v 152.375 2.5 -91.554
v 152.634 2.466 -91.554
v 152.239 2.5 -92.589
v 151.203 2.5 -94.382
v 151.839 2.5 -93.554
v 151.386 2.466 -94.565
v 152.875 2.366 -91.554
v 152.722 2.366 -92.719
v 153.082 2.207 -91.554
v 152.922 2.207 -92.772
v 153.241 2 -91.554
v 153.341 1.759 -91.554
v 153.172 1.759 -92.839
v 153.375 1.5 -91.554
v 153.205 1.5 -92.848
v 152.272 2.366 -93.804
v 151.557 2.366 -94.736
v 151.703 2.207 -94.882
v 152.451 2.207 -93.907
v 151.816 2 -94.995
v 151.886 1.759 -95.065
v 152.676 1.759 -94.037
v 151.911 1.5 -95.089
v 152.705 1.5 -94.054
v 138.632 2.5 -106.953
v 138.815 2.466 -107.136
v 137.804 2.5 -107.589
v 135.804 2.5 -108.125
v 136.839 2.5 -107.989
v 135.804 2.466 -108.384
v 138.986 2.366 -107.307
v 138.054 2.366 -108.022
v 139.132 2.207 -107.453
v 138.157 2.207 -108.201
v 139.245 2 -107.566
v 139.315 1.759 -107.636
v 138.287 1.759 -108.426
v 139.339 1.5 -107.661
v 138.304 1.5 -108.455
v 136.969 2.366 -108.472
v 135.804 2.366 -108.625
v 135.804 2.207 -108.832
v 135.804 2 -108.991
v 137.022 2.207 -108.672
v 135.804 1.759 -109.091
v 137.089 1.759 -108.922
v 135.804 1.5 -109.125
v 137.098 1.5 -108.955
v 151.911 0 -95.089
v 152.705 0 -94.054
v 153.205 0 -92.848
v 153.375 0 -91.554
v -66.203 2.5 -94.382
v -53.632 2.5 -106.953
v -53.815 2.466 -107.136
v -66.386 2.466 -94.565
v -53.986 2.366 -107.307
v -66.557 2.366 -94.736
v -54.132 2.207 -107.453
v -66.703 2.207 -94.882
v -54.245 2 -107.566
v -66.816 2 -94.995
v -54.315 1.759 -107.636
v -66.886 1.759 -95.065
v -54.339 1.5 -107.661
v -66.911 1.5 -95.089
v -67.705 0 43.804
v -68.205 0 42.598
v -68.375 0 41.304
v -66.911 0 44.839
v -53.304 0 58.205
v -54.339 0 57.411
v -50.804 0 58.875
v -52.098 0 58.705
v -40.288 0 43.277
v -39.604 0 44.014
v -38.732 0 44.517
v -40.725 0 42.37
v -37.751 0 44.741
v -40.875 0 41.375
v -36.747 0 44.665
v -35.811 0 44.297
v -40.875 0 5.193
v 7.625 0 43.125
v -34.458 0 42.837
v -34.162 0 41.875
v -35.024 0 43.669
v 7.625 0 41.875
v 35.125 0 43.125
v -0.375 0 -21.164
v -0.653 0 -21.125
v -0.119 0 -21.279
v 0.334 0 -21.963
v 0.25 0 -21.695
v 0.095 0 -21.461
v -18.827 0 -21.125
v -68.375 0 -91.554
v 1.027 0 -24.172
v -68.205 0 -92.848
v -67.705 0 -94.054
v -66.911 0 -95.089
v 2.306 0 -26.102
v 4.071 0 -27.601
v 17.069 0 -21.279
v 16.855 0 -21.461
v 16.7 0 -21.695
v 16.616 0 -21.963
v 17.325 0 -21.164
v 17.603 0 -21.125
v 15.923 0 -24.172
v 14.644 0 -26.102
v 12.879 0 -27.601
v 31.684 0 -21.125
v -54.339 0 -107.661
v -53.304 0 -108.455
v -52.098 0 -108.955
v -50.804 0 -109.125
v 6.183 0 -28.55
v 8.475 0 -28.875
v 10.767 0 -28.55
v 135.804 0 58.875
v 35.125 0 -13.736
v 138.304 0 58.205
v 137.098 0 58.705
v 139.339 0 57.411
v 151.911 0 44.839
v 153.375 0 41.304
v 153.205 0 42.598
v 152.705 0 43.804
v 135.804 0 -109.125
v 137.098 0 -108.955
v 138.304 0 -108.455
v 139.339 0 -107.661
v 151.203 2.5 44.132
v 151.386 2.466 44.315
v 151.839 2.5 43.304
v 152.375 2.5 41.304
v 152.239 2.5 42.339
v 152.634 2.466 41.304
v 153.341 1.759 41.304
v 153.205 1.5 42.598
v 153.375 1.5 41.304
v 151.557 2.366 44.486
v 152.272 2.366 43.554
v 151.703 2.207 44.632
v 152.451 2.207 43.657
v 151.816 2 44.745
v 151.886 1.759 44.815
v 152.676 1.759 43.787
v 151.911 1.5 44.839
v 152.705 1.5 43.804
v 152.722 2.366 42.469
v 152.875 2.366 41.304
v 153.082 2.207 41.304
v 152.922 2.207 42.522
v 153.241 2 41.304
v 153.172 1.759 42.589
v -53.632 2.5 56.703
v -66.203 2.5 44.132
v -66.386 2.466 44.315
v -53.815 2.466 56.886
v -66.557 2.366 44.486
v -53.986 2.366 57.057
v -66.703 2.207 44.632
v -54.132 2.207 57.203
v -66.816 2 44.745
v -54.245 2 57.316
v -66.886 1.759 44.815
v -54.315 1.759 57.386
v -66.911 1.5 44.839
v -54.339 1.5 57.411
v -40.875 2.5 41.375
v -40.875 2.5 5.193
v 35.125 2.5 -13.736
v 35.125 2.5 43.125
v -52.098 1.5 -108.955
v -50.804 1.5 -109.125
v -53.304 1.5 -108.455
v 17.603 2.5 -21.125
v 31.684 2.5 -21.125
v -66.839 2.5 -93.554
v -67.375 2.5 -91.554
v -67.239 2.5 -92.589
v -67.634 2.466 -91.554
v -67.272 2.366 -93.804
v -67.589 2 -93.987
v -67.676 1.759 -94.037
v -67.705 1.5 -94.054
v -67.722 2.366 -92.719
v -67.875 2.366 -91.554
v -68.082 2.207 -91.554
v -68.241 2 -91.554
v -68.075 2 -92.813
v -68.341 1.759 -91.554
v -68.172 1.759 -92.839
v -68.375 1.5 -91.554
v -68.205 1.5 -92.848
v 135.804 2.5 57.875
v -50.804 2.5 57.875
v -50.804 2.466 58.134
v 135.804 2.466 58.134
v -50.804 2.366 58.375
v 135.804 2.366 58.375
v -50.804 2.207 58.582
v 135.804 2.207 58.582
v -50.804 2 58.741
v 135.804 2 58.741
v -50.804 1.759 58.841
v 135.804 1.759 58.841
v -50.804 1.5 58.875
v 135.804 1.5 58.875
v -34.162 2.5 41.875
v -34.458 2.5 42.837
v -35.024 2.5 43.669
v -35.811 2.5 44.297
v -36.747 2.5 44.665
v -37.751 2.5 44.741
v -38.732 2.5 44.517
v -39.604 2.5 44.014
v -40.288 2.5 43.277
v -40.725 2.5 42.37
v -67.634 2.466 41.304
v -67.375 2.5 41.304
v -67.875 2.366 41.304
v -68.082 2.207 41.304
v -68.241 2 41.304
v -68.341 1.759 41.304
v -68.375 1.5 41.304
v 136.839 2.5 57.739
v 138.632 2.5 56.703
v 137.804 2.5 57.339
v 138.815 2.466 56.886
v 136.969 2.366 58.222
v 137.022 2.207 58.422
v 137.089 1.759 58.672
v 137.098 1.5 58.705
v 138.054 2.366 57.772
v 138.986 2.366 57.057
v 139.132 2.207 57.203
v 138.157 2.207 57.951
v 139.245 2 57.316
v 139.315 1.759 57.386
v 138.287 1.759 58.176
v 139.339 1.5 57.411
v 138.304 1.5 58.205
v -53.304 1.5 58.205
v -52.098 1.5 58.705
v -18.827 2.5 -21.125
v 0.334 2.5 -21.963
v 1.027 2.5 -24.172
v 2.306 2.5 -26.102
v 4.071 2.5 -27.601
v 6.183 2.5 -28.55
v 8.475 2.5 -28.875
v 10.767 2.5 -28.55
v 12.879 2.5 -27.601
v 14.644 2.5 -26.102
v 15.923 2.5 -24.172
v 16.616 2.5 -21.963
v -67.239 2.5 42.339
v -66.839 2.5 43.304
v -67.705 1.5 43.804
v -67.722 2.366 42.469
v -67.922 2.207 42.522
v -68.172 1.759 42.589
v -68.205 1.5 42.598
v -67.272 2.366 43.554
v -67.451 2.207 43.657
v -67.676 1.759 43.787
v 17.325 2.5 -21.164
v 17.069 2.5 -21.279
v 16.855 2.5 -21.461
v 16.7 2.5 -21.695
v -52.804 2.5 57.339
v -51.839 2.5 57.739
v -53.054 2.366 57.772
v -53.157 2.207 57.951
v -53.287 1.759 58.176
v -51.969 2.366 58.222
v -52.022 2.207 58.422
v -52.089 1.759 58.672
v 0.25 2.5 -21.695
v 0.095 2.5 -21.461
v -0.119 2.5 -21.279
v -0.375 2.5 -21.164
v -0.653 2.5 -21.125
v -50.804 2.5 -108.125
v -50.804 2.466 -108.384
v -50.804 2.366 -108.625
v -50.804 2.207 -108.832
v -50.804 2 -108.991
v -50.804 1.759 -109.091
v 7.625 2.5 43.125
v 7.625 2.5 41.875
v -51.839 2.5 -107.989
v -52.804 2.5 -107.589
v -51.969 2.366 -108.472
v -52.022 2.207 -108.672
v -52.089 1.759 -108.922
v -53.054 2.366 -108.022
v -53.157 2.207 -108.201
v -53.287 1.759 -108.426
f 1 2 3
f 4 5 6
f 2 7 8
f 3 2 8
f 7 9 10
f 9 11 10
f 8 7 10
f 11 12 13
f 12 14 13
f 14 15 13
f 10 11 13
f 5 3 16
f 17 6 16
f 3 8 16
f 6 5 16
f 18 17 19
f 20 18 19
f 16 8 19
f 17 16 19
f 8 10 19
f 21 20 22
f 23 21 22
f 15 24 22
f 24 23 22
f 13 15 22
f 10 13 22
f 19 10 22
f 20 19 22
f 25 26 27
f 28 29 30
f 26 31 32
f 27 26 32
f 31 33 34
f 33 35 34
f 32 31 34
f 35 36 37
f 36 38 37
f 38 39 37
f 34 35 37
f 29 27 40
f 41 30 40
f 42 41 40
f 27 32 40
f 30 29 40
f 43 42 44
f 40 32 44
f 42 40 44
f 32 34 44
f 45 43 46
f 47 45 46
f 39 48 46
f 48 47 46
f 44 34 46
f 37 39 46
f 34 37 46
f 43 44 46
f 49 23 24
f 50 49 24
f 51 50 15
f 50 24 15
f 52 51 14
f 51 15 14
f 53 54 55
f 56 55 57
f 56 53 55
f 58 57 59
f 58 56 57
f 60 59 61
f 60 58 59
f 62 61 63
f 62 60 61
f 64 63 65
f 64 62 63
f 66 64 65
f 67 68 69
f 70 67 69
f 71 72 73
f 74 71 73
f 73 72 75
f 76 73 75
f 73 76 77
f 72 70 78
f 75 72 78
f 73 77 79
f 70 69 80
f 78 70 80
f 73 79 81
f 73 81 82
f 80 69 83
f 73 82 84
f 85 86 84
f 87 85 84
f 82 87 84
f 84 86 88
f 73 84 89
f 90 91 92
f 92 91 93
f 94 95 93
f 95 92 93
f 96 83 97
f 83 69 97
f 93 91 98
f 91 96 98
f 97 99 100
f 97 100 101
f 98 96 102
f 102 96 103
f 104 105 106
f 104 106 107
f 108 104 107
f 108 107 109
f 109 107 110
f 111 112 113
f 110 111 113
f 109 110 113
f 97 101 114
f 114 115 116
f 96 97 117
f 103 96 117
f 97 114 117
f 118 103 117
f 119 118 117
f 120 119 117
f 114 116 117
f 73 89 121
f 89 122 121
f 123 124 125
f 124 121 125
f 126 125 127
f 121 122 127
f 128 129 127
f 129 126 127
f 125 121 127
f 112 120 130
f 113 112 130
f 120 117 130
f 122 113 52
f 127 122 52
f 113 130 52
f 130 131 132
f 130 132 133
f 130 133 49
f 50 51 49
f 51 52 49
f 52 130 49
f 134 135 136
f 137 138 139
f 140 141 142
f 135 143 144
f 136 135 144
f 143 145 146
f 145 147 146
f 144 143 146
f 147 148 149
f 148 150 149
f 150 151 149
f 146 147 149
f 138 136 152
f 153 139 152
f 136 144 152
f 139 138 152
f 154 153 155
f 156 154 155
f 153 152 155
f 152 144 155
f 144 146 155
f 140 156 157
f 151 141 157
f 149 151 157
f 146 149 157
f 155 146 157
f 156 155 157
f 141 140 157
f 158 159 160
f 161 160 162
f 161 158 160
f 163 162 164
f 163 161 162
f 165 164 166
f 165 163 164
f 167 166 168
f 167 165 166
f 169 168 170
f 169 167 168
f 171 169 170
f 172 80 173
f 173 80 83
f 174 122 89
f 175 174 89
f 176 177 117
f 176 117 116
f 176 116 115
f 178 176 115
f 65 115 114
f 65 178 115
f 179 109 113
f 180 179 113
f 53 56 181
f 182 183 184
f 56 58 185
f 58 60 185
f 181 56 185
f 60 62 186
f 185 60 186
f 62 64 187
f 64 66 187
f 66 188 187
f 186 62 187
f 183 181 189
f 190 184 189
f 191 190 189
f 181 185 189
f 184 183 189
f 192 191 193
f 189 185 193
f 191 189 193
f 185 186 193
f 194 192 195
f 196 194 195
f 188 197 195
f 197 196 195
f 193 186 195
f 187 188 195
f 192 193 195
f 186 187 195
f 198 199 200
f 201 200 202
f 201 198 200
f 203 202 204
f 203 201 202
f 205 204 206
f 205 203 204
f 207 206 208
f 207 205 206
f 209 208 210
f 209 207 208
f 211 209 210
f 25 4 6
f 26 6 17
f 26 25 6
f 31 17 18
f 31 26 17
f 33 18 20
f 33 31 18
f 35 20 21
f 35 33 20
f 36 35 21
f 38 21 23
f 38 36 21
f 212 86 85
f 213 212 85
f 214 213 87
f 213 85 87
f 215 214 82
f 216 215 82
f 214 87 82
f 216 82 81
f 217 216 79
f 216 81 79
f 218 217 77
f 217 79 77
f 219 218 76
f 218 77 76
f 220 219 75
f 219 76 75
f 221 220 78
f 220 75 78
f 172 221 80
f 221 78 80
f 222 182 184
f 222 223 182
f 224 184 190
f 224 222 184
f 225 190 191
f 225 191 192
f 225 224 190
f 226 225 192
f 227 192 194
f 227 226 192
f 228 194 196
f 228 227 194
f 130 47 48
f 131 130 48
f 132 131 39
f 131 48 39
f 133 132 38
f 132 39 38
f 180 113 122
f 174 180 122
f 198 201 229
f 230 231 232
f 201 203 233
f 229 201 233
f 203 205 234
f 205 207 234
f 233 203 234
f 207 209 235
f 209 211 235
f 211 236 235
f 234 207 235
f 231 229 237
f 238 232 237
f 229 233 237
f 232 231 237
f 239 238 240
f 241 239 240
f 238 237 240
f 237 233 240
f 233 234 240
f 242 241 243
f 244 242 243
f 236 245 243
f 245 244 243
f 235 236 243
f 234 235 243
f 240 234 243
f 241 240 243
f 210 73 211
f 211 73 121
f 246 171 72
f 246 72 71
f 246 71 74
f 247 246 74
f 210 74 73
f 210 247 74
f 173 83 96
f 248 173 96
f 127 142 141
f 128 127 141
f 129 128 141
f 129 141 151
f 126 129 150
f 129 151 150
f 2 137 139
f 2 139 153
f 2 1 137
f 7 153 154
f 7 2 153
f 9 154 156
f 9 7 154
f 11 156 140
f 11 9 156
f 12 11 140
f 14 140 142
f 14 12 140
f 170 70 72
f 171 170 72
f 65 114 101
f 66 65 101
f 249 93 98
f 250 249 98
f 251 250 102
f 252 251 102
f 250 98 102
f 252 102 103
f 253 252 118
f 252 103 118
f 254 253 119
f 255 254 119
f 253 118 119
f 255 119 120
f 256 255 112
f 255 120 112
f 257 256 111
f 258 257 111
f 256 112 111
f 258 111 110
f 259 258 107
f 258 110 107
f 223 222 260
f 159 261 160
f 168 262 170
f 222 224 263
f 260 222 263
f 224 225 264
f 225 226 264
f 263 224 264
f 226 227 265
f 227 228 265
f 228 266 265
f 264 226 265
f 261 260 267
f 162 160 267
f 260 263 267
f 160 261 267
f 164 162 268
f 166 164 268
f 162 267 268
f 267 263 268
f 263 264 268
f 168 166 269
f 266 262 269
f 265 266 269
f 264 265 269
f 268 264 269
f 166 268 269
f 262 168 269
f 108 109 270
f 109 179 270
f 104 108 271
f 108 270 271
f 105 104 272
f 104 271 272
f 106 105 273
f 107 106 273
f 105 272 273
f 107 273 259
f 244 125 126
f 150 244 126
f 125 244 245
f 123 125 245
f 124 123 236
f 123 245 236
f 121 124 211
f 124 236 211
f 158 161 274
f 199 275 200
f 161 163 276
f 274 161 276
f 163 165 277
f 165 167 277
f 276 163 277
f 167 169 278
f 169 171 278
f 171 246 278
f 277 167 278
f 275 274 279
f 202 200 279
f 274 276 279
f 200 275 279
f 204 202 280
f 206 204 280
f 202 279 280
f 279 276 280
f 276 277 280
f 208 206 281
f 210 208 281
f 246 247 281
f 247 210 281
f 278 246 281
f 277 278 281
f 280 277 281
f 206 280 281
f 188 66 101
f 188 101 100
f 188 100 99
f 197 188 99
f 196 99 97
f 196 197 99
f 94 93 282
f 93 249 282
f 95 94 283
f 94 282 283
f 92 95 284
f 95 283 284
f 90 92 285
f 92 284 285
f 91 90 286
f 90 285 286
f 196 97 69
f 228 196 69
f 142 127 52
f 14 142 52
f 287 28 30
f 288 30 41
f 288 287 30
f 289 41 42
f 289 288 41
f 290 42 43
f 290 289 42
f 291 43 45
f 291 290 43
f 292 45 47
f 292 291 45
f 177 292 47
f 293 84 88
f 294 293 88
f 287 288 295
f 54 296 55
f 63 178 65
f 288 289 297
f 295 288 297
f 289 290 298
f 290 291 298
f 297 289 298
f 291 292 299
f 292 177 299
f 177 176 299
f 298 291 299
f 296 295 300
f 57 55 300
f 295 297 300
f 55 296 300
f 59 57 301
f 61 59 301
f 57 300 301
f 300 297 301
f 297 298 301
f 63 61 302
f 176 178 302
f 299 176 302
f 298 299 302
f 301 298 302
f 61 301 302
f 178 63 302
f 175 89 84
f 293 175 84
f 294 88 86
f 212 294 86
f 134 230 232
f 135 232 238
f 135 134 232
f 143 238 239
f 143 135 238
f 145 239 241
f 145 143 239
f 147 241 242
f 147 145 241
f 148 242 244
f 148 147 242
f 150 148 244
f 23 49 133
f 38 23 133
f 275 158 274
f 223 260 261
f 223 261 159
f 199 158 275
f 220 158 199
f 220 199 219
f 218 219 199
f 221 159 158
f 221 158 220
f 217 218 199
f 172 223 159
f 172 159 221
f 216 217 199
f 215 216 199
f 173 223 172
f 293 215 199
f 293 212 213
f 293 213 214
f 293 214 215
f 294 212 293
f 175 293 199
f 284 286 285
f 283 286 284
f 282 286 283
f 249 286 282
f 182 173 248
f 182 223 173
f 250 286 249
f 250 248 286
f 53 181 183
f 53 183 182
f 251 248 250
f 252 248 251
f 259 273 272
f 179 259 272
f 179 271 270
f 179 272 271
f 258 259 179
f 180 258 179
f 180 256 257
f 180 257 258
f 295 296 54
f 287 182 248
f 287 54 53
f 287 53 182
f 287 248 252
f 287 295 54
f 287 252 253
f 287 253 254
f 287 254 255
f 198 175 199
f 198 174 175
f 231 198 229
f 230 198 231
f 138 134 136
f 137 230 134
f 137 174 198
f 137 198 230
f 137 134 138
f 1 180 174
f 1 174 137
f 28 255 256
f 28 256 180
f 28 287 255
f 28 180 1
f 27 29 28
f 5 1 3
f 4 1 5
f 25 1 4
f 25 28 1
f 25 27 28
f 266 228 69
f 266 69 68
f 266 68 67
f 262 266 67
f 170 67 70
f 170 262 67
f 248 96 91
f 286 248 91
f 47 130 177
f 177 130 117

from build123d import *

# Parameters (mm, degrees)
BOSS_EXTRUDE1_DEPTH = 2.5
FILLET2_R           = 5
FILLET3_R           = 1


with BuildPart() as part:
    # Sketch1 → Boss-Extrude1 (new body)
    with BuildSketch(Plane(origin=(0, 0, 0), x_dir=(1, 0, 0), z_dir=(0, 1, 0))):
        Polygon((137.875, 109.125), (-52.875, 109.125), (-68.375, 93.625), (-68.375, -43.375), (-52.875, -58.875), (137.875, -58.875), (153.375, -43.375), (153.375, 93.625), align=None)
        with BuildLine():
            Line((-40.875, -5.193242225), (-18.827366795, 21.125))
            Line((-18.827366795, 21.125), (0.240165454, 21.125))
            ThreePointArc((0.240165454, 21.125), (8.475, 28.875), (16.709834546, 21.125))
            Line((16.709834546, 21.125), (31.683656114, 21.125))
            Line((31.683656114, 21.125), (35.125, 13.735720962))
            Line((35.125, 13.735720962), (35.125, -43.125))
            Line((35.125, -43.125), (7.625, -43.125))
            Line((7.625, -43.125), (7.625, -41.875))
            Line((7.625, -41.875), (-34.162242519, -41.875))
            ThreePointArc((-34.162242519, -41.875), (-37.750692543, -44.740676492), (-40.875, -41.375))
            Line((-40.875, -41.375), (-40.875, -5.193242225))
        make_face(mode=Mode.SUBTRACT)
    extrude(amount=BOSS_EXTRUDE1_DEPTH)

    # Fillet2
    fillet2_edges = [part.edges().sort_by_distance(p)[0] for p in [
        (-68.375, 1.25, 43.375),
        (-68.375, 1.25, -93.625),
        (-52.875, 1.25, -109.125),
        (137.875, 1.25, -109.125),
        (153.375, 1.25, -93.625),
        (153.375, 1.25, 43.375),
        (137.875, 1.25, 58.875),
        (-52.875, 1.25, 58.875),
    ]]
    fillet(fillet2_edges, radius=FILLET2_R)

    # Fillet3
    fillet3_edges = [part.edges().sort_by_distance(p)[0] for p in [
        (16.709834546, 1.25, -21.125),
        (0.240165454, 1.25, -21.125),
        (-68.375, 2.5, -25.125),
        (-60.625, 2.5, -101.375),
        (-60.625, 2.5, 51.125),
        (42.5, 2.5, 58.875),
        (145.625, 2.5, 51.125),
        (153.375, 2.5, -25.125),
        (145.625, 2.5, -101.375),
        (42.5, 2.5, -109.125),
        (-67.994397663, 2.5, 43.21734935),
        (-52.71734935, 2.5, 58.494397663),
        (137.71734935, 2.5, 58.494397663),
        (152.994397663, 2.5, 43.21734935),
        (137.71734935, 2.5, -108.744397663),
        (152.994397663, 2.5, -93.46734935),
        (-52.71734935, 2.5, -108.744397663),
        (-67.994397663, 2.5, -93.46734935),
    ]]
    fillet(fillet3_edges, radius=FILLET3_R)


solid = part.part
